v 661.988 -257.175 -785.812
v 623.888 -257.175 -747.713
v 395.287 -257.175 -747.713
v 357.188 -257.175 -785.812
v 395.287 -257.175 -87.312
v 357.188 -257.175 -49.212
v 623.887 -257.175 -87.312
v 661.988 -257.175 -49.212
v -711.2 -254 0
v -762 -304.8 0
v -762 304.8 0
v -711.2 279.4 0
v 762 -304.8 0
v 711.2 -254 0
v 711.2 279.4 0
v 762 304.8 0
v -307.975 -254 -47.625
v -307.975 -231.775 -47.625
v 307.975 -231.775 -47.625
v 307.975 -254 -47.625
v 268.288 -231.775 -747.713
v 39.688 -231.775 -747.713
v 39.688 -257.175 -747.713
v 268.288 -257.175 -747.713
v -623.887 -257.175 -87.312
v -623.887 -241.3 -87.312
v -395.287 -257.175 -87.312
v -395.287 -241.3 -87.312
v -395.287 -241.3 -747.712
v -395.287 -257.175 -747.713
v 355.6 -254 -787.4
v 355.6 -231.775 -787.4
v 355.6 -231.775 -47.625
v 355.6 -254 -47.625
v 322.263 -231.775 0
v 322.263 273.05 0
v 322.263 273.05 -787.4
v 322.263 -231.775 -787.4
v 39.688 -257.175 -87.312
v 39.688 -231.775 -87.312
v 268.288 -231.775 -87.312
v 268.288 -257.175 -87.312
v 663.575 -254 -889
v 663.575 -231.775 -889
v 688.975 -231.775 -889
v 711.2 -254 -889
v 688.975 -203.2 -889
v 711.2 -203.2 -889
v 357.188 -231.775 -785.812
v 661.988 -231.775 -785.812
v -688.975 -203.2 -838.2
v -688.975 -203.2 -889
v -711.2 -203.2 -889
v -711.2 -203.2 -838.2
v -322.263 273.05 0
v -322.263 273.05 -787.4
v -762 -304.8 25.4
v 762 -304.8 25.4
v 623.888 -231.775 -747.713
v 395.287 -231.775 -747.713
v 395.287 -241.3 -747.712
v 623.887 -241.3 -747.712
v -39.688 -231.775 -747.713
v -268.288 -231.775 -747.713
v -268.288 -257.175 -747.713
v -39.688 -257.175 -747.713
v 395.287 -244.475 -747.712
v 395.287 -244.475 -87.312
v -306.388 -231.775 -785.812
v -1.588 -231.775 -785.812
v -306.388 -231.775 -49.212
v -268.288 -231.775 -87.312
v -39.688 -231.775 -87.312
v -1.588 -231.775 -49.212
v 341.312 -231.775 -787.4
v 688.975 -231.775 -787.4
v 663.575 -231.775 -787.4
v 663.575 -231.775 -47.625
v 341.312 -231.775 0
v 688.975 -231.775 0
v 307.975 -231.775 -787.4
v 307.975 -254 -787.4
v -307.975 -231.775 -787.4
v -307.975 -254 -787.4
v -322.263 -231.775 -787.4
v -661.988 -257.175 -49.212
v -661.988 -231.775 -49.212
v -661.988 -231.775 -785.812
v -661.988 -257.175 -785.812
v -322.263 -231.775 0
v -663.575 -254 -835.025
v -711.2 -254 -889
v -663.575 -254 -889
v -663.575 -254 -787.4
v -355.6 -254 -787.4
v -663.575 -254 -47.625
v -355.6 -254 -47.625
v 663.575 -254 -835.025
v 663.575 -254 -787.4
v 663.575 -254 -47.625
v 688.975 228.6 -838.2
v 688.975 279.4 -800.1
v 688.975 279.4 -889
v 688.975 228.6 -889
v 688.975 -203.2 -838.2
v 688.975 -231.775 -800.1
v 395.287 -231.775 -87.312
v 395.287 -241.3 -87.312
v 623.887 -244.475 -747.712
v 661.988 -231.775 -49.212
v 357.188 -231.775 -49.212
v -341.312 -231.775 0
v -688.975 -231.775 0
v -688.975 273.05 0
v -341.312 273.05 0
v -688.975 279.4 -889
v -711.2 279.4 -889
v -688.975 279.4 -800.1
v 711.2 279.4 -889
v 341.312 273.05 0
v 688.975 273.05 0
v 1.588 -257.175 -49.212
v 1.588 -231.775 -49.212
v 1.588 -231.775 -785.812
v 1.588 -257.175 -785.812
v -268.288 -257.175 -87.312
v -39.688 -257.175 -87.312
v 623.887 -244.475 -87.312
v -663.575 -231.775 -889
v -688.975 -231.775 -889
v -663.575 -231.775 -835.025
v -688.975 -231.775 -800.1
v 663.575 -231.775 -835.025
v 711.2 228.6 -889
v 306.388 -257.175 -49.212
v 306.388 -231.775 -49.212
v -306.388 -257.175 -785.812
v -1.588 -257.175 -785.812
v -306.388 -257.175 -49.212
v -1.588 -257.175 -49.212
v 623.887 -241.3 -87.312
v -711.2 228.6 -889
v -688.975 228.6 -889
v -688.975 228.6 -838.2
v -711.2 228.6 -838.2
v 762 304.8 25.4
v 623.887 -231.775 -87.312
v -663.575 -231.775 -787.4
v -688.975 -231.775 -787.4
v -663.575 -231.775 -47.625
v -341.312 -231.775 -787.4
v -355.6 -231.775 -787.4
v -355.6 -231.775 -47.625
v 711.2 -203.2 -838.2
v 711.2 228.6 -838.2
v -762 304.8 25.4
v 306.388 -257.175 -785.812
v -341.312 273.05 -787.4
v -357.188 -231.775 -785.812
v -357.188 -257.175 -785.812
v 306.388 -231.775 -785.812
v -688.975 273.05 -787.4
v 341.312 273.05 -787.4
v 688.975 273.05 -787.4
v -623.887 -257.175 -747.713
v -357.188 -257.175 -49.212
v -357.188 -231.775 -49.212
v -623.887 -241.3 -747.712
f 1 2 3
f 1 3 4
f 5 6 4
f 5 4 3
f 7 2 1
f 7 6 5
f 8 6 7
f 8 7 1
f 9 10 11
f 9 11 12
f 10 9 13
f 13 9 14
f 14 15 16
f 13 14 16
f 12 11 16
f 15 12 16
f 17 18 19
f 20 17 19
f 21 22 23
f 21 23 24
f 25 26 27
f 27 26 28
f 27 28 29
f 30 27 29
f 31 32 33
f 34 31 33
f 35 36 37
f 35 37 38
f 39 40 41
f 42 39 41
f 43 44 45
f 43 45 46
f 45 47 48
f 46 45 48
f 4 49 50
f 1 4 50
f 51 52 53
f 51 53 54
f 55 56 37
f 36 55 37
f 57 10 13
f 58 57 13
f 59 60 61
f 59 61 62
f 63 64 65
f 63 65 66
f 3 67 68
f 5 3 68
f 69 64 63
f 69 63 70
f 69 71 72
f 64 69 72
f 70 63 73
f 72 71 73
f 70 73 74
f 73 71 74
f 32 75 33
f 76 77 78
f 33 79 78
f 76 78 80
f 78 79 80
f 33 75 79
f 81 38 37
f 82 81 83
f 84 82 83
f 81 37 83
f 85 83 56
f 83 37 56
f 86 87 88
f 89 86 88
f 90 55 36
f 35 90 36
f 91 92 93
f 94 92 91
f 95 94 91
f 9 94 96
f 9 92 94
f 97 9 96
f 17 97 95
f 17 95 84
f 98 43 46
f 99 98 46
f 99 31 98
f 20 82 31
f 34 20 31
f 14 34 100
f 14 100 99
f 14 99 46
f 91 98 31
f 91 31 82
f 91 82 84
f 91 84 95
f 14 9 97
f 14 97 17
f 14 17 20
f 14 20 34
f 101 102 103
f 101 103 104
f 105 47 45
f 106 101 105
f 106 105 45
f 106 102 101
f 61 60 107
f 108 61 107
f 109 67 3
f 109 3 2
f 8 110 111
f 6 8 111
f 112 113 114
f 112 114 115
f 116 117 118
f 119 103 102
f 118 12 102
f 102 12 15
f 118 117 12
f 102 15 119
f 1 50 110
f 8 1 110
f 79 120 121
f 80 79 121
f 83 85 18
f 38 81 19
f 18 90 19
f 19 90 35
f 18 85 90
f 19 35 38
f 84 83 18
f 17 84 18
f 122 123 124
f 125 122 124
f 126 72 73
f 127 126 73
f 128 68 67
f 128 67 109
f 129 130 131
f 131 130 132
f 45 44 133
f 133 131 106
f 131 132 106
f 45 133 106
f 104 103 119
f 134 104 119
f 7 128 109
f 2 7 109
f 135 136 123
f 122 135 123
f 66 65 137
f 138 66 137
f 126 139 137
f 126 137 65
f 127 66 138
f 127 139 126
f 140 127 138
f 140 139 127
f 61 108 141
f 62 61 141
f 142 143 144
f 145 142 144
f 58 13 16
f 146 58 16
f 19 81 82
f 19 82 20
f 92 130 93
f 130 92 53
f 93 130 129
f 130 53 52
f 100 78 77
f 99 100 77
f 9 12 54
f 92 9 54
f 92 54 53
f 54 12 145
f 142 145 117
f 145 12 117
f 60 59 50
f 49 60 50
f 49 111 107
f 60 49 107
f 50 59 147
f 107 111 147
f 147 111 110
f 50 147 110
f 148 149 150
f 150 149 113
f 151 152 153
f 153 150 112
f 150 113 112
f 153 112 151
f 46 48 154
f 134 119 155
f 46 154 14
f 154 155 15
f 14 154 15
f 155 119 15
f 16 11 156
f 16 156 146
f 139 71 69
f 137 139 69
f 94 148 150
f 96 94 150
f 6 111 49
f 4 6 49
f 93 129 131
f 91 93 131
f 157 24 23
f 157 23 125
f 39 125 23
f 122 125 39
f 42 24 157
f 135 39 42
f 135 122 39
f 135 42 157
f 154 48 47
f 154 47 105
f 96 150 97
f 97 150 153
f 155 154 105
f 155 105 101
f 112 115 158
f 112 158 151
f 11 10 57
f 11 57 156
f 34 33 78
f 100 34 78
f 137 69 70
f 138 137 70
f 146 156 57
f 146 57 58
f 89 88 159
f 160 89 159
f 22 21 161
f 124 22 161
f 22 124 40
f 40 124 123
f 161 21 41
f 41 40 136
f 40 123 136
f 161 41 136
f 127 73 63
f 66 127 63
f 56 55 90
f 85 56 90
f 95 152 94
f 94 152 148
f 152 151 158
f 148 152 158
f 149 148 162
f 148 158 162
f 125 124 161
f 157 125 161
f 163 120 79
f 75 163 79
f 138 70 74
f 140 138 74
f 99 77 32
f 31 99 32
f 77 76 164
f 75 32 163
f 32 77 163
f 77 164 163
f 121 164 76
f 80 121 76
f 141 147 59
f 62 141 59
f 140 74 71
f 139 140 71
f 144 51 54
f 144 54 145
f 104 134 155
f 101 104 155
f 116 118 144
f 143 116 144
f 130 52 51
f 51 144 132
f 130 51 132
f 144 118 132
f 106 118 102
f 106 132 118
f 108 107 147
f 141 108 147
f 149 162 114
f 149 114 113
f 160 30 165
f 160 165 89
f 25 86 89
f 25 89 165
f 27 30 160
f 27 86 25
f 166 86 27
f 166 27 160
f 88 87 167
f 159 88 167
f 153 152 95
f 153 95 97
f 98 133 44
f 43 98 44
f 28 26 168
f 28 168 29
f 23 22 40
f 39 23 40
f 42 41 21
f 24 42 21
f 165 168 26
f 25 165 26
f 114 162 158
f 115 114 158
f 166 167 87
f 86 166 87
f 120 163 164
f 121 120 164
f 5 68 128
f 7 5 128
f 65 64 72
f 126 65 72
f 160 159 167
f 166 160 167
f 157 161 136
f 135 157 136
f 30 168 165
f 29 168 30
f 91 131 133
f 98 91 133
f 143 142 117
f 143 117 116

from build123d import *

# Parameters (mm, degrees)
F0_W      = 1524
F0_H      = 609.6
F1_DEPTH  = 25.4
F2_W      = 22.225
F2_H      = 511.175
F3_DEPTH  = 889
F2_W_2    = 19.05
F2_H_2    = 504.825
F4_DEPTH  = 787.4
F6_W      = 1377.95
F6_H      = 504.825
F7_DEPTH  = 12.7
F9_W      = 47.625
F9_H      = 739.775
F10_DEPTH = 22.225
F11_W     = 228.6
F11_H     = 38.1
F12_DEPTH = 25.4
F13_W     = 1377.95
F13_H     = 6.35
F14_DEPTH = 800.1
F15_W     = 228.6
F15_H     = 9.525
F16_DEPTH = 660.4
F15_H_2   = 3.175
F17_DEPTH = 660.4
F18_W     = 431.8
F18_H     = 50.8
F19_DEPTH = 1473.201


with BuildPart() as f1:
    # F0 (on Top) → F1 (new body)
    with BuildSketch(Plane.XY):
        Rectangle(F0_W, F0_H)
    extrude(amount=F1_DEPTH)

    # F2 (on face) → F3 (join)
    with BuildSketch(Plane(origin=(0, 0, 0), x_dir=(1, 0, 0), z_dir=(0, 0, -1))):
        with Locations((-700.0875, -23.8125)):
            Rectangle(F2_W, F2_H)
        with Locations((700.0875, -23.8125)):
            Rectangle(F2_W, F2_H)
    extrude(amount=F3_DEPTH)

    # F2 (on face) → F4 (join)
    with BuildSketch(Plane(origin=(0, 0, 0), x_dir=(1, 0, 0), z_dir=(0, 0, -1))):
        with Locations((-700.0875, -23.8125)):
            Rectangle(F2_W, F2_H)
        with Locations((700.0875, -23.8125)):
            Rectangle(F2_W, F2_H)
        with Locations((-331.7875, -20.6375)):
            Rectangle(F2_W_2, F2_H_2)
        with Locations((331.7875, -20.6375)):
            Rectangle(F2_W_2, F2_H_2)
    extrude(amount=F4_DEPTH)

    # F6 (on offset) → F7 (join)
    with BuildSketch(Plane(origin=(0, 0, -787.4), x_dir=(1, 0, 0), z_dir=(0, 0, -1))):
        with Locations((0, -20.6375)):
            Rectangle(F6_W, F6_H)
    extrude(amount=F7_DEPTH)

    # F9 (on offset) → F10 (join)
    with BuildSketch(Plane.XZ.offset(231.775)):
        Polygon((-663.575, 0), (-711.2, 0), (-711.2, -889), (-663.575, -889), (-663.575, -835.025), (-663.575, -787.4), (-663.575, -47.625), align=None)
        Polygon((663.575, 0), (-663.575, 0), (-663.575, -47.625), (-355.6, -47.625), (-307.975, -47.625), (307.975, -47.625), (355.6, -47.625), (663.575, -47.625), align=None)
        Polygon((711.2, 0), (663.575, 0), (663.575, -47.625), (663.575, -787.4), (663.575, -835.025), (663.575, -889), (711.2, -889), align=None)
        Polygon((-355.6, -787.4), (-663.575, -787.4), (-663.575, -835.025), (663.575, -835.025), (663.575, -787.4), (355.6, -787.4), (307.975, -787.4), (-307.975, -787.4), align=None)
        with Locations((-331.7875, -417.5125)):
            Rectangle(F9_W, F9_H)
        with Locations((331.7875, -417.5125)):
            Rectangle(F9_W, F9_H)
    extrude(amount=F10_DEPTH)

    # F13 (on face) → F14 (join, through all)
    with BuildSketch(Plane(origin=(0, 0, 0), x_dir=(1, 0, 0), z_dir=(0, 0, -1))):
        with Locations((0, -276.225)):
            Rectangle(F13_W, F13_H)
    extrude(amount=F14_DEPTH)

    # F18 (on face) → F19 (cut, through all)
    with BuildSketch(Plane.YZ.offset(711.2)):
        with Locations((12.7, -863.6)):
            Rectangle(F18_W, F18_H)
    extrude(amount=-F19_DEPTH, mode=Mode.SUBTRACT)


with BuildPart() as f12:
    # F11 (on offset) → F12 (new body)
    with BuildSketch(Plane.XZ.offset(231.775)):
        Polygon((-623.8875, -49.2125), (-661.9875, -49.2125), (-661.9875, -785.8125), (-623.8875, -785.8125), (-623.8875, -747.7125), (-623.8875, -87.3125), align=None)
        with Locations((-509.5875, -68.2625)):
            Rectangle(F11_W, F11_H)
        Polygon((-357.1875, -49.2125), (-395.2875, -49.2125), (-395.2875, -87.3125), (-395.2875, -747.7125), (-395.2875, -785.8125), (-357.1875, -785.8125), align=None)
        with Locations((-509.5875, -766.7625)):
            Rectangle(F11_W, F11_H)
    extrude(amount=F12_DEPTH)

    # F15 (on face) → F16 (join, through all)
    with BuildSketch(Plane.XY.offset(-747.7125)):
        with Locations((-509.5875, -236.5375)):
            Rectangle(F15_W, F15_H)
    extrude(amount=F16_DEPTH)


with BuildPart() as f12b:
    # F11 (on offset) → F12, piece 2 (new body)
    with BuildSketch(Plane.XZ.offset(231.775)):
        Polygon((357.1875, -785.8125), (395.2875, -785.8125), (395.2875, -747.7125), (395.2875, -87.3125), (395.2875, -49.2125), (357.1875, -49.2125), align=None)
        with Locations((509.5875, -766.7625)):
            Rectangle(F11_W, F11_H)
        Polygon((623.8875, -747.7125), (623.8875, -785.8125), (661.9875, -785.8125), (661.9875, -49.2125), (623.8875, -49.2125), (623.8875, -87.3125), align=None)
        with Locations((509.5875, -68.2625)):
            Rectangle(F11_W, F11_H)
    extrude(amount=F12_DEPTH)

    # F15 (on face) → F17 (join, through all)
    with BuildSketch(Plane.XY.offset(-747.7125)):
        with Locations((509.5875, -242.8875)):
            Rectangle(F15_W, F15_H_2)
    extrude(amount=F17_DEPTH)


with BuildPart() as f12c:
    # F11 (on offset) → F12, piece 3 (new body)
    with BuildSketch(Plane.XZ.offset(231.775)):
        Polygon((-268.2875, -49.2125), (-306.3875, -49.2125), (-306.3875, -785.8125), (-268.2875, -785.8125), (-268.2875, -747.7125), (-268.2875, -87.3125), align=None)
        with Locations((-153.9875, -68.2625)):
            Rectangle(F11_W, F11_H)
        Polygon((-1.5875, -49.2125), (-39.6875, -49.2125), (-39.6875, -87.3125), (-39.6875, -747.7125), (-39.6875, -785.8125), (-1.5875, -785.8125), align=None)
        with Locations((-153.9875, -766.7625)):
            Rectangle(F11_W, F11_H)
    extrude(amount=F12_DEPTH)


with BuildPart() as f12d:
    # F11 (on offset) → F12, piece 4 (new body)
    with BuildSketch(Plane.XZ.offset(231.775)):
        Polygon((306.3875, -785.8125), (306.3875, -49.2125), (268.2875, -49.2125), (268.2875, -87.3125), (268.2875, -747.7125), (268.2875, -785.8125), align=None)
        with Locations((153.9875, -68.2625)):
            Rectangle(F11_W, F11_H)
        Polygon((39.6875, -87.3125), (39.6875, -49.2125), (1.5875, -49.2125), (1.5875, -785.8125), (39.6875, -785.8125), (39.6875, -747.7125), align=None)
        with Locations((153.9875, -766.7625)):
            Rectangle(F11_W, F11_H)
    extrude(amount=F12_DEPTH)


solid = Compound([f1.part, f12.part, f12b.part, f12c.part, f12d.part])
